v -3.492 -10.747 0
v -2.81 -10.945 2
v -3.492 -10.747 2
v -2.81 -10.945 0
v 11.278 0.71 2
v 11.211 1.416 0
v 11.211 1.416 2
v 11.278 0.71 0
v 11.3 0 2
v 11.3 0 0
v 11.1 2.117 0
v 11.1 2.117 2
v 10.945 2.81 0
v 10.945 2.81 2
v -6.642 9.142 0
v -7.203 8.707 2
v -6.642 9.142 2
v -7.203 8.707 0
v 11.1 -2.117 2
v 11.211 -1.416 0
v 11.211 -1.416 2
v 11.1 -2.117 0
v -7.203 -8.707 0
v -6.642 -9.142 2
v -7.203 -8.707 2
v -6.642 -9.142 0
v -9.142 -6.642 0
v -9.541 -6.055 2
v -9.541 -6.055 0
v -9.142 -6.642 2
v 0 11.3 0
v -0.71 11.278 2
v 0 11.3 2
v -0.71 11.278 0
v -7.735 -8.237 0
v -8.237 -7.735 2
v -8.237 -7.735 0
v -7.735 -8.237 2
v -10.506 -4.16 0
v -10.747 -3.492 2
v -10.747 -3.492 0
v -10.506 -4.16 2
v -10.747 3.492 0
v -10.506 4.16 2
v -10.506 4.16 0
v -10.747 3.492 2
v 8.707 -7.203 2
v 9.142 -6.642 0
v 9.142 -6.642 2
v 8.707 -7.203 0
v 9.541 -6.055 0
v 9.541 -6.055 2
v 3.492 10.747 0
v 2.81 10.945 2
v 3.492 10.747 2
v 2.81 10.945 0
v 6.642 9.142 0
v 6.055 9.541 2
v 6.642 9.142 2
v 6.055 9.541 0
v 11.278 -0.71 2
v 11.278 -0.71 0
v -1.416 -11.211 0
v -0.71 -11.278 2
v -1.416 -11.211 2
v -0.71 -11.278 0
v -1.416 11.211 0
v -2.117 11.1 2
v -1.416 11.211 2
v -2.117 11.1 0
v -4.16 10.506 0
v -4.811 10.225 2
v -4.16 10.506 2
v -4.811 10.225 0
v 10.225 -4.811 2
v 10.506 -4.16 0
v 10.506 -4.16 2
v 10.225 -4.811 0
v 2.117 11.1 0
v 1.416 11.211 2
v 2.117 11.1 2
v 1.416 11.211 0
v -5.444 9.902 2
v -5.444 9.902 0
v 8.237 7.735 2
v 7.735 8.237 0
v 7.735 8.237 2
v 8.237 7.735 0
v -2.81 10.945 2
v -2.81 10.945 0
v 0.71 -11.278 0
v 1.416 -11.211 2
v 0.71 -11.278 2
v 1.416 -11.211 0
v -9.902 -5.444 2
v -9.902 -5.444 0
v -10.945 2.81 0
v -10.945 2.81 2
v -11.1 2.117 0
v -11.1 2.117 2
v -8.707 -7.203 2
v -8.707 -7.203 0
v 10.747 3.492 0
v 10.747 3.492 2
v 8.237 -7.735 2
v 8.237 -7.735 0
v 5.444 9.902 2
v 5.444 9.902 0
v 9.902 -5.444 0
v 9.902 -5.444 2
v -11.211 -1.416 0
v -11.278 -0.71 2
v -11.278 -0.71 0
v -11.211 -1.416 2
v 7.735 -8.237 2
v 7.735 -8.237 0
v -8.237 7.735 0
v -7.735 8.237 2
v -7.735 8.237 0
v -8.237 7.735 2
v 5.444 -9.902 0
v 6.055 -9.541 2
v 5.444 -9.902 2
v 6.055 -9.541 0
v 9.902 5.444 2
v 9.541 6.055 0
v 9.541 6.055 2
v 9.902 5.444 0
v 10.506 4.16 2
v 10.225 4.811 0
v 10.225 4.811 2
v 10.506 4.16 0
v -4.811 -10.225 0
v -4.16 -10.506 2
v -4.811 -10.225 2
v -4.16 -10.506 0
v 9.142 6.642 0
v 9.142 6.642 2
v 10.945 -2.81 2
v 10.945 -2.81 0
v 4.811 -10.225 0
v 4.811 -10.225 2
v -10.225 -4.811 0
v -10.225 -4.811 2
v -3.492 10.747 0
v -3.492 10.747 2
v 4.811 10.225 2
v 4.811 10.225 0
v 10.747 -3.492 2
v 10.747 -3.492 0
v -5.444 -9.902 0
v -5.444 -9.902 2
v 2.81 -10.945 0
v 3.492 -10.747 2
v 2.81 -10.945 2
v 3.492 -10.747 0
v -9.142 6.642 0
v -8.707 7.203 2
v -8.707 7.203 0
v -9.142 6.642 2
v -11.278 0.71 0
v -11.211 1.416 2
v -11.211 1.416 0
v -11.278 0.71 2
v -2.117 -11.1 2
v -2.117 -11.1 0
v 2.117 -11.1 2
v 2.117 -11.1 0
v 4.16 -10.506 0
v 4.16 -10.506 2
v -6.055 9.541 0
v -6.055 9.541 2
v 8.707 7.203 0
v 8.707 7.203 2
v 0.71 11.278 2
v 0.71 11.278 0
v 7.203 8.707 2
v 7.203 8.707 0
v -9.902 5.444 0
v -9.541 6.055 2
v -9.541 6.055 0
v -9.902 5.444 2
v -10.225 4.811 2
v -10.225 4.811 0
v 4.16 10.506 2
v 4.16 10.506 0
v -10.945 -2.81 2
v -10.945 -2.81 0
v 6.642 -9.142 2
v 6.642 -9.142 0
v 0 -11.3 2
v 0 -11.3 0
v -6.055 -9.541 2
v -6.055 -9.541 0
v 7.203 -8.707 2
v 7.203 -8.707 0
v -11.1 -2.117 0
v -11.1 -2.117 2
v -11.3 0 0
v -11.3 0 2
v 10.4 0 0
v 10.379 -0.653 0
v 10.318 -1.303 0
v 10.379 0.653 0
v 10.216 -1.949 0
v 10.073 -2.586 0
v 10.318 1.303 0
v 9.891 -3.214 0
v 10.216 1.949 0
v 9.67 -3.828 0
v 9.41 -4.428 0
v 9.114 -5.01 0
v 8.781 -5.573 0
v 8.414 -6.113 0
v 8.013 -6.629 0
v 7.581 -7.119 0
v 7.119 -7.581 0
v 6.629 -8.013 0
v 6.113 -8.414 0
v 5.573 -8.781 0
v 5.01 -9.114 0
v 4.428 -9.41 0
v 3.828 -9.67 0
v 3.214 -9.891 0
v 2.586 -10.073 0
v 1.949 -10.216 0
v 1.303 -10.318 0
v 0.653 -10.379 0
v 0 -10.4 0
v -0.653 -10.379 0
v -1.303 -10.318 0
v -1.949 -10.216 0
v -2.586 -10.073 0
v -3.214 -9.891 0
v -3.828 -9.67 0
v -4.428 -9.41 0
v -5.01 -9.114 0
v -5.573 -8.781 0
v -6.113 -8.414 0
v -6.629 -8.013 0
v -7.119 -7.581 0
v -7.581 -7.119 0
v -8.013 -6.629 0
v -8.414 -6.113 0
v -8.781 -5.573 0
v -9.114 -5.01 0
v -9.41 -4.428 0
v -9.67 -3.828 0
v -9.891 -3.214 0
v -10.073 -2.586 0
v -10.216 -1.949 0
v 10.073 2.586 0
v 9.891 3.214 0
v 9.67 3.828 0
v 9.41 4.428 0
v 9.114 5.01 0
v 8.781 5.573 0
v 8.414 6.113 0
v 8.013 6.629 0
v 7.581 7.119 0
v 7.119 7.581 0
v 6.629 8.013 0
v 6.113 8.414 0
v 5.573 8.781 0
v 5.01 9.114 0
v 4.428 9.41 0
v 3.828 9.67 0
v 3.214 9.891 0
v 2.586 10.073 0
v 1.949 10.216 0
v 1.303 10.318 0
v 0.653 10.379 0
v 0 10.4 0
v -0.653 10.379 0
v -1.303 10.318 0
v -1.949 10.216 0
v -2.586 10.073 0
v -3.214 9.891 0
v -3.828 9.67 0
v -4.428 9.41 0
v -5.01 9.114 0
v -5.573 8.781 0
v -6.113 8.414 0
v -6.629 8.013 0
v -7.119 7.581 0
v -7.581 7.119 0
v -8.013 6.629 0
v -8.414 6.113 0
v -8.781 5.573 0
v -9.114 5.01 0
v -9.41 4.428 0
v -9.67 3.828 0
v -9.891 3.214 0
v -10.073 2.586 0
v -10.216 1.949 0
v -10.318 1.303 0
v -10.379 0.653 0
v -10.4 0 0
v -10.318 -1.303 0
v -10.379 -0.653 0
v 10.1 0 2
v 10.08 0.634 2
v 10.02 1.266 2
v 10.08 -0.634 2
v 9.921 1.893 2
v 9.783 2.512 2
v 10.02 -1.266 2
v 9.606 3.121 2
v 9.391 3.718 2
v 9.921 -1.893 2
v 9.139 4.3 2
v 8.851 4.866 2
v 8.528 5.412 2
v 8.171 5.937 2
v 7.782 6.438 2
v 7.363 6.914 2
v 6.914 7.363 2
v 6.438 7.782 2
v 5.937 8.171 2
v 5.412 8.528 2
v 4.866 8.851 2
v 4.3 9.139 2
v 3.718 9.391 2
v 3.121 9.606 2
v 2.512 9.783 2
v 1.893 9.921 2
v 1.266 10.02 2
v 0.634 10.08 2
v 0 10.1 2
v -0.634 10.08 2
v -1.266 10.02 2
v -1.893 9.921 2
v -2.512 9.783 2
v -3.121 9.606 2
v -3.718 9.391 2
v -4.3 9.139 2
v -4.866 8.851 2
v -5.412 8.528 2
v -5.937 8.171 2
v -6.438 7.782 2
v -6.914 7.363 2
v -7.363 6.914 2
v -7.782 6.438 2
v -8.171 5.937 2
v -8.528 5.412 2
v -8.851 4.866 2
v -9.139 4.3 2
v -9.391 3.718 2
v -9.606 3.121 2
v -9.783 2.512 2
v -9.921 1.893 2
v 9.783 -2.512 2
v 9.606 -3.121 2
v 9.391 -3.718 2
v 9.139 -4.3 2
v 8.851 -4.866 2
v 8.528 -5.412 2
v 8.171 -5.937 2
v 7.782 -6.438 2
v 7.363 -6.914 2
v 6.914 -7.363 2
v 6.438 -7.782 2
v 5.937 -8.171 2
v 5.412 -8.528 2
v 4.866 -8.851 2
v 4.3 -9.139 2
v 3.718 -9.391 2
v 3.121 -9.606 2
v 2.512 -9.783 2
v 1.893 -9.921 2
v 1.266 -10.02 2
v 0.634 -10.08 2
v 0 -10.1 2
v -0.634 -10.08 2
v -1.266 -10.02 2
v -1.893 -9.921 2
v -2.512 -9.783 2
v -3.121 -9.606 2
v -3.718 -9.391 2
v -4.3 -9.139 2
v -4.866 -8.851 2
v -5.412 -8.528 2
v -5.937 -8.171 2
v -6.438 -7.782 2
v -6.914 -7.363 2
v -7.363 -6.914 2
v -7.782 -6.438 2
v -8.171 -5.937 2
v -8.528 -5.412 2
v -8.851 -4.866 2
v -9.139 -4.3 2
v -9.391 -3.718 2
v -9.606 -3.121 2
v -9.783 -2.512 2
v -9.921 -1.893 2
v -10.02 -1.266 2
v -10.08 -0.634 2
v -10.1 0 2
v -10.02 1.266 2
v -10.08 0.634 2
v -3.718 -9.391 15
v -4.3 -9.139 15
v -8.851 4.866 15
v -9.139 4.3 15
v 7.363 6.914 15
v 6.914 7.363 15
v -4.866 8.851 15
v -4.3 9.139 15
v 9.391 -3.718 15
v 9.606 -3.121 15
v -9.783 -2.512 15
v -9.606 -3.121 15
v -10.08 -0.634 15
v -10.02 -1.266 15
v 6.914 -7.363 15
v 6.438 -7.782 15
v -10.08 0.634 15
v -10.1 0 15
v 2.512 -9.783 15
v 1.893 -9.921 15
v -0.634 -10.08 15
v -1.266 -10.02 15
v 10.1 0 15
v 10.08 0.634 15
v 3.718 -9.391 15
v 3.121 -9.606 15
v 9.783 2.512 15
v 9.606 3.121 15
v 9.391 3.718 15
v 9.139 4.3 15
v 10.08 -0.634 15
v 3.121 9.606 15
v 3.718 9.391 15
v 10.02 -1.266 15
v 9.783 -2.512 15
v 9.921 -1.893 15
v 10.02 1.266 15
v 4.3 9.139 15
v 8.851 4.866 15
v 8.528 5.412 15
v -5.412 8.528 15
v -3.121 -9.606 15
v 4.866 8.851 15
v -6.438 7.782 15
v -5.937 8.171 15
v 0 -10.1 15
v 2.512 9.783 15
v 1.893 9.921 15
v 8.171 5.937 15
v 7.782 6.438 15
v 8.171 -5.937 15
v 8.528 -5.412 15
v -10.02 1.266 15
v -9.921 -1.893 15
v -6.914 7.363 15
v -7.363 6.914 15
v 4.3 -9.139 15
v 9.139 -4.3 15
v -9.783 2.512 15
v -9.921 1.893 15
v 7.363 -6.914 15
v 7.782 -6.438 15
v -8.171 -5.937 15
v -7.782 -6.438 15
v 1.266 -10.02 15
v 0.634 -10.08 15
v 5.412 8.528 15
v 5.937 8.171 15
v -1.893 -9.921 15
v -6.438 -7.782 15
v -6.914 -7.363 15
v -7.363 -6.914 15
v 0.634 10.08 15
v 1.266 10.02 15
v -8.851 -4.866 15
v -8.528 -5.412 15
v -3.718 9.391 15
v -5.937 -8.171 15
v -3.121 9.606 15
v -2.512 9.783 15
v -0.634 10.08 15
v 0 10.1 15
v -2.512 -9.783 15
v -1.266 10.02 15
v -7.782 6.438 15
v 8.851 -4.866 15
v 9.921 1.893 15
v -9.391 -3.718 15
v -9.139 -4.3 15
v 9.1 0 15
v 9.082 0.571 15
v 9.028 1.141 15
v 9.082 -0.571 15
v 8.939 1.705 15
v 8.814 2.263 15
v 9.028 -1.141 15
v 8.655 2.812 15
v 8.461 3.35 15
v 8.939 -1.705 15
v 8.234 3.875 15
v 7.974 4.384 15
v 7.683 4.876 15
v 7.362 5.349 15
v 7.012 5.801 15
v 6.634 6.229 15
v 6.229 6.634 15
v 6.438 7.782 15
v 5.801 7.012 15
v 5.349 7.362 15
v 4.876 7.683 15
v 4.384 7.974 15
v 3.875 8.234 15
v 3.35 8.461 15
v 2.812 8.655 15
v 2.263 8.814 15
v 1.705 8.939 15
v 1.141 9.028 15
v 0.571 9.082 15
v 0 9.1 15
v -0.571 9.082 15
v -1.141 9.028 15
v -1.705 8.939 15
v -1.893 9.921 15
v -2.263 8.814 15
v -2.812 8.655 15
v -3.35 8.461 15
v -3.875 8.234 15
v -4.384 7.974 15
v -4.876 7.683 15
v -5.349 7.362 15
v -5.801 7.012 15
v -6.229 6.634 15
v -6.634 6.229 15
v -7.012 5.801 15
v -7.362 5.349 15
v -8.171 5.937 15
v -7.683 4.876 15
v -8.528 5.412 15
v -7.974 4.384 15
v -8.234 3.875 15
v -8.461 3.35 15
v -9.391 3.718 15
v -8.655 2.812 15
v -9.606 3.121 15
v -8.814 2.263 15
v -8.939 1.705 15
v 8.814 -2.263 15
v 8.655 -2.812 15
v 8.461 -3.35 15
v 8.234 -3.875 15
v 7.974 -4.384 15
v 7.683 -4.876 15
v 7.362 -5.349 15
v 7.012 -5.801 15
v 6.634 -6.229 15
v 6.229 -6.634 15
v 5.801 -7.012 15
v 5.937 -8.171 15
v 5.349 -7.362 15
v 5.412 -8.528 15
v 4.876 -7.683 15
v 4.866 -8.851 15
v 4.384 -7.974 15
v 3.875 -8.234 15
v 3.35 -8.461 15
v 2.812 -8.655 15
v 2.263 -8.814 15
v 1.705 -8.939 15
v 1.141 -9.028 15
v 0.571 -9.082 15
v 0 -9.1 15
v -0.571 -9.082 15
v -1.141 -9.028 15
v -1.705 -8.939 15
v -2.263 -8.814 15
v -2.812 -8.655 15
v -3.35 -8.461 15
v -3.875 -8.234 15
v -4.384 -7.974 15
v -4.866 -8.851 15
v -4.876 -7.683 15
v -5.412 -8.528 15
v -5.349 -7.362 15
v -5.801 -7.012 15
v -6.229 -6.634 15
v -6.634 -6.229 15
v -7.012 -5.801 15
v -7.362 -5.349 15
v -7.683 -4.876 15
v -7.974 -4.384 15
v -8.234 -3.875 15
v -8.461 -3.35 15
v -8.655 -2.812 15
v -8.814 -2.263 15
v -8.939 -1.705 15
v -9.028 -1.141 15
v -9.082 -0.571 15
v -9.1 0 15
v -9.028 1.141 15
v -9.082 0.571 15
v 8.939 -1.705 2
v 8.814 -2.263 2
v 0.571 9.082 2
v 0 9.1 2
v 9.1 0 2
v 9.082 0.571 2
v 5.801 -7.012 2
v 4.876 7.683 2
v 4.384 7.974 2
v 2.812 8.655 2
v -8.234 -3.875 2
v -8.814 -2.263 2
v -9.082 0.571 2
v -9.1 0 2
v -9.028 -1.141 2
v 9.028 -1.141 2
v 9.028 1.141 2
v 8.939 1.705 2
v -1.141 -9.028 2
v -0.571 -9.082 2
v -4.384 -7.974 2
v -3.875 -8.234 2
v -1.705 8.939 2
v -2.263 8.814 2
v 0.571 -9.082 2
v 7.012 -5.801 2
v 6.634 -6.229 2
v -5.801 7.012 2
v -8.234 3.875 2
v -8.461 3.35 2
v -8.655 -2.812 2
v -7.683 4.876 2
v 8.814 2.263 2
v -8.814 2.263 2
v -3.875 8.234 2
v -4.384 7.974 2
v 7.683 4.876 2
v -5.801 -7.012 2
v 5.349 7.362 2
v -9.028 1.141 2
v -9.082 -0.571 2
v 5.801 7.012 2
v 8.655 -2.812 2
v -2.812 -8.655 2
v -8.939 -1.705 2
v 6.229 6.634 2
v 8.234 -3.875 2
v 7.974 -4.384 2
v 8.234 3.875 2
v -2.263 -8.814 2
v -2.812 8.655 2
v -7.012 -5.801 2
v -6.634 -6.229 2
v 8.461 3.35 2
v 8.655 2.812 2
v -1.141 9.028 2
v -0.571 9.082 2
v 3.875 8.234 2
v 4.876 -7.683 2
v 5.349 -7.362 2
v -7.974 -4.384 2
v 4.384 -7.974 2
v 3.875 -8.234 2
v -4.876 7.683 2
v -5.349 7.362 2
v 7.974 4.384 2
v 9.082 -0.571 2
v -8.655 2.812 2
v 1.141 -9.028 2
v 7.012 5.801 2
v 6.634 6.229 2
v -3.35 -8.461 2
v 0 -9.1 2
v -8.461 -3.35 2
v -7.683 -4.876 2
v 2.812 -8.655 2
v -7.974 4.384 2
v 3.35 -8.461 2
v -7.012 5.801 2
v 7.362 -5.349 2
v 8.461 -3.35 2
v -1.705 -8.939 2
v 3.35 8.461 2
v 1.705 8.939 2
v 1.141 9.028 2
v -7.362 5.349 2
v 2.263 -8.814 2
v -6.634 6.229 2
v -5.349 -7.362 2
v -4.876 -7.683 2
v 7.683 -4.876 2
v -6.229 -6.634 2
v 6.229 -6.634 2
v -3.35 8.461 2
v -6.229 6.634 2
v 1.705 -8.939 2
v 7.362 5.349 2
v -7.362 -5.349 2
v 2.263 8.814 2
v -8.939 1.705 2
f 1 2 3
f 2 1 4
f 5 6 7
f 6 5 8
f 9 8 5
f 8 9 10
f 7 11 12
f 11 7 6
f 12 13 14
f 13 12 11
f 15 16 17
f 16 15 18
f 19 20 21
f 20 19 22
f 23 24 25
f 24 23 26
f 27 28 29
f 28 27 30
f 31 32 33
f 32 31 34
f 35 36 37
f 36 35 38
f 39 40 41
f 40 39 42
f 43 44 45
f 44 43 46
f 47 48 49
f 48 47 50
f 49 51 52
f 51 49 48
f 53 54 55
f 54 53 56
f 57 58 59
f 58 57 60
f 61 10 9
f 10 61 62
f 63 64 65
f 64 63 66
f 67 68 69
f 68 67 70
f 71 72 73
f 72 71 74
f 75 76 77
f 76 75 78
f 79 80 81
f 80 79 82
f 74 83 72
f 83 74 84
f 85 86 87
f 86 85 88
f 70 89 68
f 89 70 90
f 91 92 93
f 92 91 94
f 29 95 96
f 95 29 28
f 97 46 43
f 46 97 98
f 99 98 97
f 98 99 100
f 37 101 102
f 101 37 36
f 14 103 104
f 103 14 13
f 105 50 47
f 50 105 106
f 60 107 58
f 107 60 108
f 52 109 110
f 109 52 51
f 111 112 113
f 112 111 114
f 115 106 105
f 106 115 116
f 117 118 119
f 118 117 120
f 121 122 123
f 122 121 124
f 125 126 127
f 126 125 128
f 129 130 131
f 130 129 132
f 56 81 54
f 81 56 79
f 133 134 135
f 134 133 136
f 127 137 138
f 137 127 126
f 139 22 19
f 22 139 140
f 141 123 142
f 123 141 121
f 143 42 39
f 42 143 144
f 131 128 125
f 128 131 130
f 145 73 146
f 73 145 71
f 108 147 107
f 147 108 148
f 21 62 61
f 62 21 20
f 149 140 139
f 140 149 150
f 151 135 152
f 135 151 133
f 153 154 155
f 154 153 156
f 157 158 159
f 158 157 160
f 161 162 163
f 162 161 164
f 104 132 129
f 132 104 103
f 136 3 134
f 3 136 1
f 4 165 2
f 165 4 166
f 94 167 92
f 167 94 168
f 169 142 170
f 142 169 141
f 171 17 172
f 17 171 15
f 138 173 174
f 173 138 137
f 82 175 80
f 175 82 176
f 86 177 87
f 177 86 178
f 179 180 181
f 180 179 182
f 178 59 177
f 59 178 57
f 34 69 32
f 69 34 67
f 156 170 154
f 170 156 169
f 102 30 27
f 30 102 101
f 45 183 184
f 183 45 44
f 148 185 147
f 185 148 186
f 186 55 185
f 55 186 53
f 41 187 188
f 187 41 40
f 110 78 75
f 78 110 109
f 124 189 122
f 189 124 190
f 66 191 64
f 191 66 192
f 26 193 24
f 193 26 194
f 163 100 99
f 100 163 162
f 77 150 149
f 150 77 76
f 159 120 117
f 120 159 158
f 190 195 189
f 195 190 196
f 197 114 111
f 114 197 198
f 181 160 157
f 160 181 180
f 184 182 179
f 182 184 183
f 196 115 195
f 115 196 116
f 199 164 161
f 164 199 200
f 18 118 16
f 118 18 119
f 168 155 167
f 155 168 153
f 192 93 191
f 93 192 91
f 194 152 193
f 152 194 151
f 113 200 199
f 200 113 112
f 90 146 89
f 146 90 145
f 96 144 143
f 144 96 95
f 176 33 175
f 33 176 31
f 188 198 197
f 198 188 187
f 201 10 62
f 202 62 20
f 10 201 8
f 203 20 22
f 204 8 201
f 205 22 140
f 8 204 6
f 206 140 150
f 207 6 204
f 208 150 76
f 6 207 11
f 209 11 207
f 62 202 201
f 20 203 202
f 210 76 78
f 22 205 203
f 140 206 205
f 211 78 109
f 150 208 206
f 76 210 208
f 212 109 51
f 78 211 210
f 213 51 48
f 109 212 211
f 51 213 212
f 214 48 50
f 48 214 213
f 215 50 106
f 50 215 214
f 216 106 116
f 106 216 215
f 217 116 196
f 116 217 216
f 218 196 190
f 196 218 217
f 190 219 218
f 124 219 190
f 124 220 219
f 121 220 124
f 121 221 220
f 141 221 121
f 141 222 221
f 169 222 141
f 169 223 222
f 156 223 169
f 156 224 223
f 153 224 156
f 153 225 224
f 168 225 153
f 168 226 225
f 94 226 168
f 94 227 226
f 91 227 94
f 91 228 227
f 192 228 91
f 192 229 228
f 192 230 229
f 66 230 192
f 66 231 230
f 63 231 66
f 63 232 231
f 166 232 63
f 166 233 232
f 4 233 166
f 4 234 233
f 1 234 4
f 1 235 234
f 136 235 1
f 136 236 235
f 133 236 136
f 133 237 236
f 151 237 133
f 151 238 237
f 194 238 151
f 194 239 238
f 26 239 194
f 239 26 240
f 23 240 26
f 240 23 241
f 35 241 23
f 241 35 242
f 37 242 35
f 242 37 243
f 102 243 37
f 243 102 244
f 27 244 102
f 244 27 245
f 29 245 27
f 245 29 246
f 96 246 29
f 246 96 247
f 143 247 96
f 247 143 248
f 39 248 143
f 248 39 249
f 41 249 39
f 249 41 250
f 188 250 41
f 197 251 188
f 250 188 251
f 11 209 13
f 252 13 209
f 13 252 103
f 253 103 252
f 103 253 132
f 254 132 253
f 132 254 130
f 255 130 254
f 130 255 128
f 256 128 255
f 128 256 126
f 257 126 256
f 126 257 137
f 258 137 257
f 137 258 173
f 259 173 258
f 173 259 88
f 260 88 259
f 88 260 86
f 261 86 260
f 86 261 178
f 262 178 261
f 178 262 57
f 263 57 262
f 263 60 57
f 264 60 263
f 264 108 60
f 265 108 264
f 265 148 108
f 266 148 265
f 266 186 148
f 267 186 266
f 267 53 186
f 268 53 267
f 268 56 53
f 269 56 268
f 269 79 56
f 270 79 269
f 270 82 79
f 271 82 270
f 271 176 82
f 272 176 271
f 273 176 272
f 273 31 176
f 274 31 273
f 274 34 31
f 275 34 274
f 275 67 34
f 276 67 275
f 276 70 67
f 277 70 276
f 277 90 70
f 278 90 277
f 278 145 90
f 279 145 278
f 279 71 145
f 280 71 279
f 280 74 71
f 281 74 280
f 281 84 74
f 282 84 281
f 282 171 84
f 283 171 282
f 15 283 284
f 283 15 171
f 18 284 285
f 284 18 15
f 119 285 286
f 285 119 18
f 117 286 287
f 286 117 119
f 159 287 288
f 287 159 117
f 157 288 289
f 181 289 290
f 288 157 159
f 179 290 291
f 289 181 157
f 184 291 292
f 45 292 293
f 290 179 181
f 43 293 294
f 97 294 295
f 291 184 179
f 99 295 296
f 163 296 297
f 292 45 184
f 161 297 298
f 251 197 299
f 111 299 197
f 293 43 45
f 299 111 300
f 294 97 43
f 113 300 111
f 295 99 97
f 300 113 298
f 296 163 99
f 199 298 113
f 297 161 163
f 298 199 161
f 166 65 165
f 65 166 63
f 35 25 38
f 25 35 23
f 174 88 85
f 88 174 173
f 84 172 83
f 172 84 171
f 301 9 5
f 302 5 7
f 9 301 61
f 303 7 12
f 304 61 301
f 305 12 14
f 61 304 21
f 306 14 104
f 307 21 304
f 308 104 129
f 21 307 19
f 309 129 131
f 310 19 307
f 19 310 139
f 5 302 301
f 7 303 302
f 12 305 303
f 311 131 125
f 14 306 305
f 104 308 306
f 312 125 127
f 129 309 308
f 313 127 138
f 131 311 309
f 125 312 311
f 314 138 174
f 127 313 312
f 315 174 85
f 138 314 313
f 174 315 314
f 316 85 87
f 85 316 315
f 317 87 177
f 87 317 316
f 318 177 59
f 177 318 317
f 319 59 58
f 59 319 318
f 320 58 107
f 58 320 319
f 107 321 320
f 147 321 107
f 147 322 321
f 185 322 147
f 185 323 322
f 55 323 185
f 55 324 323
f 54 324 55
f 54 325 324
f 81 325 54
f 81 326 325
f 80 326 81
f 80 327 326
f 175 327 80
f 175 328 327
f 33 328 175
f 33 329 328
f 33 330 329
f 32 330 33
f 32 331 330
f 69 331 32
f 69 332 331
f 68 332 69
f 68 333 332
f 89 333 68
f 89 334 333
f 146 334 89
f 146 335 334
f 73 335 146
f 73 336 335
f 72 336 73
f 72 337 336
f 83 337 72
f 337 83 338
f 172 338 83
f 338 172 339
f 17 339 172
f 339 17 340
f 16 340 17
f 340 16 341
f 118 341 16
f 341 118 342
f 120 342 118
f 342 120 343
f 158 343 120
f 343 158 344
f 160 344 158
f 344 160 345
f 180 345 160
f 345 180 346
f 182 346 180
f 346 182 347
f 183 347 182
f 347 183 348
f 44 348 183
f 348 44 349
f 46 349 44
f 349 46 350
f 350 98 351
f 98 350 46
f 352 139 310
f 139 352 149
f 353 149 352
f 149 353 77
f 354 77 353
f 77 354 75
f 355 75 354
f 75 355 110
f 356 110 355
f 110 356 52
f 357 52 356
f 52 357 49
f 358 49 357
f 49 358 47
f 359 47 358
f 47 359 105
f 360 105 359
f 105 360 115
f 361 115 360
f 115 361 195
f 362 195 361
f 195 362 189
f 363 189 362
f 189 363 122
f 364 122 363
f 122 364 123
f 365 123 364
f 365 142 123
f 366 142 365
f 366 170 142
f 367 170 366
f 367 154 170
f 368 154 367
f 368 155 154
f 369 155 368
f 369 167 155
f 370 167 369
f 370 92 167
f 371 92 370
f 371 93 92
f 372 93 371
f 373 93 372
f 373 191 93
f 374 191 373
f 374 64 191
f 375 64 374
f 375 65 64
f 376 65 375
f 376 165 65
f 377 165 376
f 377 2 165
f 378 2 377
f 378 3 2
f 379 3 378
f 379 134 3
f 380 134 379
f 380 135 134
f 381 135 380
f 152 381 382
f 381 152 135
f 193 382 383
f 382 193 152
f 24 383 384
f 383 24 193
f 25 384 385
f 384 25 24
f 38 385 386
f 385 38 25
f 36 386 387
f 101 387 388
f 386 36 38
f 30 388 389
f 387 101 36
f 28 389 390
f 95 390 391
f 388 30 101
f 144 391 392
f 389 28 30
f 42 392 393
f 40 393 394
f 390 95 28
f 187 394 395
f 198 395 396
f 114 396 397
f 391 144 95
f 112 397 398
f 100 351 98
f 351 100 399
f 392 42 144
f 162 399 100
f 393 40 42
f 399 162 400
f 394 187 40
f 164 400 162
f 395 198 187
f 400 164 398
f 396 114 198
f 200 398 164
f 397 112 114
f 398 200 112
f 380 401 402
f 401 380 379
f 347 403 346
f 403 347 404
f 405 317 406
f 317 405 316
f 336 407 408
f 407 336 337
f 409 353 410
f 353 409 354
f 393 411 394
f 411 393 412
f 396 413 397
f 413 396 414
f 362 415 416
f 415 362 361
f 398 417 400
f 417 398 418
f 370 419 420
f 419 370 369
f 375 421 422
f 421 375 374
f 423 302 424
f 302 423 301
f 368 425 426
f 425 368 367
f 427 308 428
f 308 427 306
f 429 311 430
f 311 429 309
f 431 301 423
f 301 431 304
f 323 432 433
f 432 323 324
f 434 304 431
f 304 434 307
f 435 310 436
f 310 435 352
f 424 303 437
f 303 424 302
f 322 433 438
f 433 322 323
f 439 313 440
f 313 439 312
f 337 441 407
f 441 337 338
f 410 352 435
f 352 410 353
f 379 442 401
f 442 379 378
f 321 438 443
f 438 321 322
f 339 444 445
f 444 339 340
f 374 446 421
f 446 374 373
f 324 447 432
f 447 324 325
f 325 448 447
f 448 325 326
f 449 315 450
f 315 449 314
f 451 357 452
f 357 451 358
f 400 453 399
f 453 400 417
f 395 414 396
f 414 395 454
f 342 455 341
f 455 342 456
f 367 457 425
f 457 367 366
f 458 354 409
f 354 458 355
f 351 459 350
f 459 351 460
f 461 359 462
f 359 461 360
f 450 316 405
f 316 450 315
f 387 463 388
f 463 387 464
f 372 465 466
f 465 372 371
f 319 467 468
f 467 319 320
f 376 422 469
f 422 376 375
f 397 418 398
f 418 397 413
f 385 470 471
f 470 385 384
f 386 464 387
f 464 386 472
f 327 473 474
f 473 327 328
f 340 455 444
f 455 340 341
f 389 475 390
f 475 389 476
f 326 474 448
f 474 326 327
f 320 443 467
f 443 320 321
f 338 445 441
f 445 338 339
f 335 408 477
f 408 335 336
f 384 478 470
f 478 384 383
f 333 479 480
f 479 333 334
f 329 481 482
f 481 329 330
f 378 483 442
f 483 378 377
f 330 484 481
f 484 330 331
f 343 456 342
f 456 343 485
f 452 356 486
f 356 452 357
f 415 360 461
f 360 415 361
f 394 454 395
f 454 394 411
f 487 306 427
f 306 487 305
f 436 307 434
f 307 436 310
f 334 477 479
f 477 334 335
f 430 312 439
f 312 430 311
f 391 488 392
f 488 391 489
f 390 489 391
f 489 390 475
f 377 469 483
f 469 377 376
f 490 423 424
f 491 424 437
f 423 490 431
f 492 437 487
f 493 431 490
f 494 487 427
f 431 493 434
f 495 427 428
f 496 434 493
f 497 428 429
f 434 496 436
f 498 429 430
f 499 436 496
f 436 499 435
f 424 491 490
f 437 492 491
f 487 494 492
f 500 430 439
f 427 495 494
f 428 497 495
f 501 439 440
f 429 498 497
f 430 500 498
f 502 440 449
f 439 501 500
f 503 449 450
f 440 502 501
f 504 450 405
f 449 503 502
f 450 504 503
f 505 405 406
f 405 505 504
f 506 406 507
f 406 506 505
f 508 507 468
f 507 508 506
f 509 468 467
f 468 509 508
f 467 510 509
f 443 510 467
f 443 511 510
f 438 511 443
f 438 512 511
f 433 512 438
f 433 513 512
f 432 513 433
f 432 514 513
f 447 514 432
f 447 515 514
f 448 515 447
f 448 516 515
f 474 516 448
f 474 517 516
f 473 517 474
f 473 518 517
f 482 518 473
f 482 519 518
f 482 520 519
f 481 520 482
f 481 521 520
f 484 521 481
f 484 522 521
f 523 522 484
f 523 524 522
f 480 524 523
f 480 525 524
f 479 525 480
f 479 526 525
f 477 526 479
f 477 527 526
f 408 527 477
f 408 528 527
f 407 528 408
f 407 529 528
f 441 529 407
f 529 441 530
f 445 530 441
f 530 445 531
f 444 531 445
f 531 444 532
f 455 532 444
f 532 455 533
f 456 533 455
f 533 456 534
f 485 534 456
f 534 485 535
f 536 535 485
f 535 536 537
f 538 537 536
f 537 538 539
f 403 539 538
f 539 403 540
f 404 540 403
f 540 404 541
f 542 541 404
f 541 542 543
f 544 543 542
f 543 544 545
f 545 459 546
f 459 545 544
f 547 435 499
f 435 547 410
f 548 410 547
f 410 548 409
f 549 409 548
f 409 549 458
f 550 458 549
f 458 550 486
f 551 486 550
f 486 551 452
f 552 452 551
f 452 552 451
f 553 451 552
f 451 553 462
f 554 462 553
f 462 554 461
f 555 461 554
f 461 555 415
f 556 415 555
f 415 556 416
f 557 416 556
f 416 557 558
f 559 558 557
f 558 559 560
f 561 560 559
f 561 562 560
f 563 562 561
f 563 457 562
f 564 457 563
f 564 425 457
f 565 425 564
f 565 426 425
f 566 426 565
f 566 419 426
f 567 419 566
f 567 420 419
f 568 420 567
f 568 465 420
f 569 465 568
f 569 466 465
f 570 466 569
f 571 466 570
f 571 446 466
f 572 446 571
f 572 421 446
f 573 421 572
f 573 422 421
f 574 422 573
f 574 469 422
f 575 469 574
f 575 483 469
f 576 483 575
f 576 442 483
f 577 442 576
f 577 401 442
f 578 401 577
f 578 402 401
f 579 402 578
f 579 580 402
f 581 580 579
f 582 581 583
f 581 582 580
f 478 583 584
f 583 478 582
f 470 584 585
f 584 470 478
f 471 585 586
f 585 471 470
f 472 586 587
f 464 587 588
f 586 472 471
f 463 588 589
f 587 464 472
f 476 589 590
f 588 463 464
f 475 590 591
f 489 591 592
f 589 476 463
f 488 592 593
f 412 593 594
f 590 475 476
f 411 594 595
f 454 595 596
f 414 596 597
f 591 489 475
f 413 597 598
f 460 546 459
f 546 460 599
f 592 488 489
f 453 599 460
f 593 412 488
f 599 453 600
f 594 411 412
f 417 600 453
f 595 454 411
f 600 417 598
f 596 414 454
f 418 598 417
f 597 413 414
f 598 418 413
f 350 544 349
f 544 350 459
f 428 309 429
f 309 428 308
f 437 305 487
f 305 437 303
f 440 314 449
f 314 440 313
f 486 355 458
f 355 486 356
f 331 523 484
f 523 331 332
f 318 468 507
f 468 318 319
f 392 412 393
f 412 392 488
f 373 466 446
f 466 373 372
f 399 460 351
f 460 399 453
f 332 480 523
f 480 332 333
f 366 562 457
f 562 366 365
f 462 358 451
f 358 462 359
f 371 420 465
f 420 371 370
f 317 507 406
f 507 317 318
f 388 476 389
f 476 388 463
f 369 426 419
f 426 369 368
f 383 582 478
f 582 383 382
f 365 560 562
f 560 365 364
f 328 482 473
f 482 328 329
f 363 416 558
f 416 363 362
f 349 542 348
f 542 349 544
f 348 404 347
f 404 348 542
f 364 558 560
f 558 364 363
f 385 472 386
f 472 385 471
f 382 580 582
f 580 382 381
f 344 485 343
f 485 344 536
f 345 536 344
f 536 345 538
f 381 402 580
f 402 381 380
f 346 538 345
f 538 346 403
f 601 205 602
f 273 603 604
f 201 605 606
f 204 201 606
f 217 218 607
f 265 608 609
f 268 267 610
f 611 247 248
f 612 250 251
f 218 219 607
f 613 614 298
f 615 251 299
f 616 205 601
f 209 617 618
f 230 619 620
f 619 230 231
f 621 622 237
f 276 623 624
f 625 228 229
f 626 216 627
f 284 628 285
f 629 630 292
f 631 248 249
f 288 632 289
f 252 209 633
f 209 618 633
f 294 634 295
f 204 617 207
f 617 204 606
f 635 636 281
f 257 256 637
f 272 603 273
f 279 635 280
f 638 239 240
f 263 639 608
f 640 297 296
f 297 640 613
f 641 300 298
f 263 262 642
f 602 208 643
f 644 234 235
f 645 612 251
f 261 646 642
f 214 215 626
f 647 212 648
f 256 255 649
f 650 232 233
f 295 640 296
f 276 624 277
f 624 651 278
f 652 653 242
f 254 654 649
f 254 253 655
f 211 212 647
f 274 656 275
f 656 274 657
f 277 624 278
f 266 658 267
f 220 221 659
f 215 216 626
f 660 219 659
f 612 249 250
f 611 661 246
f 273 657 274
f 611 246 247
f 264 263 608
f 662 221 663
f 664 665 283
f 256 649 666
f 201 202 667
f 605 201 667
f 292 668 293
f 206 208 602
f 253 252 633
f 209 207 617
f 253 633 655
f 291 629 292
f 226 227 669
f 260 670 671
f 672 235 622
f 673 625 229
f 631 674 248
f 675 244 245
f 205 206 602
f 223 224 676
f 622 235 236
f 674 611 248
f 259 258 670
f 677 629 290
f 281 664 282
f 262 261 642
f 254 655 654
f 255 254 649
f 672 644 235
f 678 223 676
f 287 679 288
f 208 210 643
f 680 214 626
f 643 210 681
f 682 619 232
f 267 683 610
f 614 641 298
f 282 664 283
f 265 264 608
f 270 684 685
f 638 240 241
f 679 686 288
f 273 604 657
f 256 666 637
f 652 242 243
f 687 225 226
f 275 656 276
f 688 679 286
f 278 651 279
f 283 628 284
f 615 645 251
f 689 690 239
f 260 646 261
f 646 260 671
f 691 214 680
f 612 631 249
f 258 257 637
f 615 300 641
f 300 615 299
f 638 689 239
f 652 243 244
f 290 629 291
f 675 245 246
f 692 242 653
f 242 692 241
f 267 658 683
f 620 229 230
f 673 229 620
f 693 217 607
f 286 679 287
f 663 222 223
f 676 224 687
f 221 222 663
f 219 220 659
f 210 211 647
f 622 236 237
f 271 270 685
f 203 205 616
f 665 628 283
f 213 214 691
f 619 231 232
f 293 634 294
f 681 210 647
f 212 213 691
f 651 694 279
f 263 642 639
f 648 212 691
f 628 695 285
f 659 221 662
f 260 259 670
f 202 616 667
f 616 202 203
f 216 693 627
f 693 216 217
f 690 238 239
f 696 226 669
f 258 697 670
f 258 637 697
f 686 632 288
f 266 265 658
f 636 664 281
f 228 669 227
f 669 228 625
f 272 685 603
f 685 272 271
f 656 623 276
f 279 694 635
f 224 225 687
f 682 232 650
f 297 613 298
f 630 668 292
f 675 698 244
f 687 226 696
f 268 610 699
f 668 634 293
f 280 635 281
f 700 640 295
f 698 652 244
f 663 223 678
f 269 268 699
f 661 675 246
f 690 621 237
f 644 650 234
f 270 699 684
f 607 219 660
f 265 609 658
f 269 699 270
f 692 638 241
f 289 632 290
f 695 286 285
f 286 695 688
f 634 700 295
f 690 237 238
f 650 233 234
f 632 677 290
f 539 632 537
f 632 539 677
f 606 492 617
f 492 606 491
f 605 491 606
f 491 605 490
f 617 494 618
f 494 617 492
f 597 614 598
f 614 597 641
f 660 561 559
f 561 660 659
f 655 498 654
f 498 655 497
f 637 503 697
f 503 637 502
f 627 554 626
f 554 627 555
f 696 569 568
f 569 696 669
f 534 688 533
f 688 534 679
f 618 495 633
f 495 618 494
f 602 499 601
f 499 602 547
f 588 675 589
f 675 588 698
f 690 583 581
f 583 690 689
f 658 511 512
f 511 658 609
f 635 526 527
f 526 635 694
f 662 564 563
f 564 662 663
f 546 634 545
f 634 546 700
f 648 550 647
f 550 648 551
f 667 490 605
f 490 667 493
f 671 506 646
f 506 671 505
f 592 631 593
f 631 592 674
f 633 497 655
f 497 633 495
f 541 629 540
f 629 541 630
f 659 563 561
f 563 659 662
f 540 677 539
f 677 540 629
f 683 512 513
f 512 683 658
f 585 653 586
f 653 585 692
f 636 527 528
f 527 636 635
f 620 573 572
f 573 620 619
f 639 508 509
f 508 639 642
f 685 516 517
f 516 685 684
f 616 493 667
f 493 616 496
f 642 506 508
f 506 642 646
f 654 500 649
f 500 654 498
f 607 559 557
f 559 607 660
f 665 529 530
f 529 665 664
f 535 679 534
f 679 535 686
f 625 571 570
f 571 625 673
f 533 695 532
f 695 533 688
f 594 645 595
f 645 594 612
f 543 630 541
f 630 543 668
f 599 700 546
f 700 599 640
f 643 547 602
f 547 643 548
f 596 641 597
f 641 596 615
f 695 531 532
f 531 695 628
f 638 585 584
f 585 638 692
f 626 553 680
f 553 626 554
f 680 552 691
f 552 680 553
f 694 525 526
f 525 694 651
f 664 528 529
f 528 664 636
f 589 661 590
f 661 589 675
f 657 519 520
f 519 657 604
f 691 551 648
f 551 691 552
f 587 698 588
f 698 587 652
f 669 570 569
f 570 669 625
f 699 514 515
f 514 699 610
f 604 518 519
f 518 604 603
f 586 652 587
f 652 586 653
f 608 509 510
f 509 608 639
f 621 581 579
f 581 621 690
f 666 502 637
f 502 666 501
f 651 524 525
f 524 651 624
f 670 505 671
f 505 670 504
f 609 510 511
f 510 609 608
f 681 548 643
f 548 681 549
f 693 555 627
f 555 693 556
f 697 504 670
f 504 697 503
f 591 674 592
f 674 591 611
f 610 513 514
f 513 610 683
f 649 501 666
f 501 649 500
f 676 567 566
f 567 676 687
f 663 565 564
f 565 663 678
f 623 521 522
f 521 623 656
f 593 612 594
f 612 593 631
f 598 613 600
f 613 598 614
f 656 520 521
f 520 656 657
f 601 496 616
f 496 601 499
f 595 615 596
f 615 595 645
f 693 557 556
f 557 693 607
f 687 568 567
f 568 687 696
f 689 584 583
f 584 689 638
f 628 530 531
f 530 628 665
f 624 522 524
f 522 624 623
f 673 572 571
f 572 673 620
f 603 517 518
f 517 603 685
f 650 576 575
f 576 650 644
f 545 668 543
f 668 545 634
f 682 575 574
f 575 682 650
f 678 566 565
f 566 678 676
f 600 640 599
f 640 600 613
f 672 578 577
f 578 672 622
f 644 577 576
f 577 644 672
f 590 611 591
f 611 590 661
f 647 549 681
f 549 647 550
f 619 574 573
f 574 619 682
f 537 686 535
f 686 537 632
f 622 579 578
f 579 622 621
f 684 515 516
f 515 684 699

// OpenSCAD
// file: ../../config.scad
//rocket
wall_thickness = 0.9;
motorwall_thickness = 2;
module_height = 140;

//liftoff_ring
liftoff_ring = true;
ring_diameter = 4;
ring_thickness = 1;
ring_height = 10;
ring_translate_angle = 11.5;

//stabilizer
stabilizer_thickness = 0.8;
stabilizer_count = 3;
stabilizer_height = 60;
stabilizer_width = 30;
stabilizer_angle = 50;

//motor
motor_diameter = 18.6;
motor_height = 70;

//joint
joint_height = 13;
joint_space = 0.3;
joint_thickness = 1;
joint_transition_height = 2;

outer_diameter = motor_diameter+motorwall_thickness*2;
// main file
include <../../config.scad>

module joint() {
    difference() {
        union() {
            cylinder(d=outer_diameter, h=joint_transition_height, $fn=100);

            translate([0, 0, joint_transition_height])
                cylinder(d=outer_diameter-wall_thickness*2-joint_space*2, h=joint_height, $fn=100);
        }

        cylinder(d1=outer_diameter-wall_thickness*2, d2=outer_diameter-wall_thickness*2-joint_space*2-joint_thickness*2, h=joint_transition_height, $fn=100);

        cylinder(d=outer_diameter-wall_thickness*2-joint_space*2-joint_thickness*2, h=joint_height+0.1+joint_transition_height, $fn=100);
    }
}

joint();
